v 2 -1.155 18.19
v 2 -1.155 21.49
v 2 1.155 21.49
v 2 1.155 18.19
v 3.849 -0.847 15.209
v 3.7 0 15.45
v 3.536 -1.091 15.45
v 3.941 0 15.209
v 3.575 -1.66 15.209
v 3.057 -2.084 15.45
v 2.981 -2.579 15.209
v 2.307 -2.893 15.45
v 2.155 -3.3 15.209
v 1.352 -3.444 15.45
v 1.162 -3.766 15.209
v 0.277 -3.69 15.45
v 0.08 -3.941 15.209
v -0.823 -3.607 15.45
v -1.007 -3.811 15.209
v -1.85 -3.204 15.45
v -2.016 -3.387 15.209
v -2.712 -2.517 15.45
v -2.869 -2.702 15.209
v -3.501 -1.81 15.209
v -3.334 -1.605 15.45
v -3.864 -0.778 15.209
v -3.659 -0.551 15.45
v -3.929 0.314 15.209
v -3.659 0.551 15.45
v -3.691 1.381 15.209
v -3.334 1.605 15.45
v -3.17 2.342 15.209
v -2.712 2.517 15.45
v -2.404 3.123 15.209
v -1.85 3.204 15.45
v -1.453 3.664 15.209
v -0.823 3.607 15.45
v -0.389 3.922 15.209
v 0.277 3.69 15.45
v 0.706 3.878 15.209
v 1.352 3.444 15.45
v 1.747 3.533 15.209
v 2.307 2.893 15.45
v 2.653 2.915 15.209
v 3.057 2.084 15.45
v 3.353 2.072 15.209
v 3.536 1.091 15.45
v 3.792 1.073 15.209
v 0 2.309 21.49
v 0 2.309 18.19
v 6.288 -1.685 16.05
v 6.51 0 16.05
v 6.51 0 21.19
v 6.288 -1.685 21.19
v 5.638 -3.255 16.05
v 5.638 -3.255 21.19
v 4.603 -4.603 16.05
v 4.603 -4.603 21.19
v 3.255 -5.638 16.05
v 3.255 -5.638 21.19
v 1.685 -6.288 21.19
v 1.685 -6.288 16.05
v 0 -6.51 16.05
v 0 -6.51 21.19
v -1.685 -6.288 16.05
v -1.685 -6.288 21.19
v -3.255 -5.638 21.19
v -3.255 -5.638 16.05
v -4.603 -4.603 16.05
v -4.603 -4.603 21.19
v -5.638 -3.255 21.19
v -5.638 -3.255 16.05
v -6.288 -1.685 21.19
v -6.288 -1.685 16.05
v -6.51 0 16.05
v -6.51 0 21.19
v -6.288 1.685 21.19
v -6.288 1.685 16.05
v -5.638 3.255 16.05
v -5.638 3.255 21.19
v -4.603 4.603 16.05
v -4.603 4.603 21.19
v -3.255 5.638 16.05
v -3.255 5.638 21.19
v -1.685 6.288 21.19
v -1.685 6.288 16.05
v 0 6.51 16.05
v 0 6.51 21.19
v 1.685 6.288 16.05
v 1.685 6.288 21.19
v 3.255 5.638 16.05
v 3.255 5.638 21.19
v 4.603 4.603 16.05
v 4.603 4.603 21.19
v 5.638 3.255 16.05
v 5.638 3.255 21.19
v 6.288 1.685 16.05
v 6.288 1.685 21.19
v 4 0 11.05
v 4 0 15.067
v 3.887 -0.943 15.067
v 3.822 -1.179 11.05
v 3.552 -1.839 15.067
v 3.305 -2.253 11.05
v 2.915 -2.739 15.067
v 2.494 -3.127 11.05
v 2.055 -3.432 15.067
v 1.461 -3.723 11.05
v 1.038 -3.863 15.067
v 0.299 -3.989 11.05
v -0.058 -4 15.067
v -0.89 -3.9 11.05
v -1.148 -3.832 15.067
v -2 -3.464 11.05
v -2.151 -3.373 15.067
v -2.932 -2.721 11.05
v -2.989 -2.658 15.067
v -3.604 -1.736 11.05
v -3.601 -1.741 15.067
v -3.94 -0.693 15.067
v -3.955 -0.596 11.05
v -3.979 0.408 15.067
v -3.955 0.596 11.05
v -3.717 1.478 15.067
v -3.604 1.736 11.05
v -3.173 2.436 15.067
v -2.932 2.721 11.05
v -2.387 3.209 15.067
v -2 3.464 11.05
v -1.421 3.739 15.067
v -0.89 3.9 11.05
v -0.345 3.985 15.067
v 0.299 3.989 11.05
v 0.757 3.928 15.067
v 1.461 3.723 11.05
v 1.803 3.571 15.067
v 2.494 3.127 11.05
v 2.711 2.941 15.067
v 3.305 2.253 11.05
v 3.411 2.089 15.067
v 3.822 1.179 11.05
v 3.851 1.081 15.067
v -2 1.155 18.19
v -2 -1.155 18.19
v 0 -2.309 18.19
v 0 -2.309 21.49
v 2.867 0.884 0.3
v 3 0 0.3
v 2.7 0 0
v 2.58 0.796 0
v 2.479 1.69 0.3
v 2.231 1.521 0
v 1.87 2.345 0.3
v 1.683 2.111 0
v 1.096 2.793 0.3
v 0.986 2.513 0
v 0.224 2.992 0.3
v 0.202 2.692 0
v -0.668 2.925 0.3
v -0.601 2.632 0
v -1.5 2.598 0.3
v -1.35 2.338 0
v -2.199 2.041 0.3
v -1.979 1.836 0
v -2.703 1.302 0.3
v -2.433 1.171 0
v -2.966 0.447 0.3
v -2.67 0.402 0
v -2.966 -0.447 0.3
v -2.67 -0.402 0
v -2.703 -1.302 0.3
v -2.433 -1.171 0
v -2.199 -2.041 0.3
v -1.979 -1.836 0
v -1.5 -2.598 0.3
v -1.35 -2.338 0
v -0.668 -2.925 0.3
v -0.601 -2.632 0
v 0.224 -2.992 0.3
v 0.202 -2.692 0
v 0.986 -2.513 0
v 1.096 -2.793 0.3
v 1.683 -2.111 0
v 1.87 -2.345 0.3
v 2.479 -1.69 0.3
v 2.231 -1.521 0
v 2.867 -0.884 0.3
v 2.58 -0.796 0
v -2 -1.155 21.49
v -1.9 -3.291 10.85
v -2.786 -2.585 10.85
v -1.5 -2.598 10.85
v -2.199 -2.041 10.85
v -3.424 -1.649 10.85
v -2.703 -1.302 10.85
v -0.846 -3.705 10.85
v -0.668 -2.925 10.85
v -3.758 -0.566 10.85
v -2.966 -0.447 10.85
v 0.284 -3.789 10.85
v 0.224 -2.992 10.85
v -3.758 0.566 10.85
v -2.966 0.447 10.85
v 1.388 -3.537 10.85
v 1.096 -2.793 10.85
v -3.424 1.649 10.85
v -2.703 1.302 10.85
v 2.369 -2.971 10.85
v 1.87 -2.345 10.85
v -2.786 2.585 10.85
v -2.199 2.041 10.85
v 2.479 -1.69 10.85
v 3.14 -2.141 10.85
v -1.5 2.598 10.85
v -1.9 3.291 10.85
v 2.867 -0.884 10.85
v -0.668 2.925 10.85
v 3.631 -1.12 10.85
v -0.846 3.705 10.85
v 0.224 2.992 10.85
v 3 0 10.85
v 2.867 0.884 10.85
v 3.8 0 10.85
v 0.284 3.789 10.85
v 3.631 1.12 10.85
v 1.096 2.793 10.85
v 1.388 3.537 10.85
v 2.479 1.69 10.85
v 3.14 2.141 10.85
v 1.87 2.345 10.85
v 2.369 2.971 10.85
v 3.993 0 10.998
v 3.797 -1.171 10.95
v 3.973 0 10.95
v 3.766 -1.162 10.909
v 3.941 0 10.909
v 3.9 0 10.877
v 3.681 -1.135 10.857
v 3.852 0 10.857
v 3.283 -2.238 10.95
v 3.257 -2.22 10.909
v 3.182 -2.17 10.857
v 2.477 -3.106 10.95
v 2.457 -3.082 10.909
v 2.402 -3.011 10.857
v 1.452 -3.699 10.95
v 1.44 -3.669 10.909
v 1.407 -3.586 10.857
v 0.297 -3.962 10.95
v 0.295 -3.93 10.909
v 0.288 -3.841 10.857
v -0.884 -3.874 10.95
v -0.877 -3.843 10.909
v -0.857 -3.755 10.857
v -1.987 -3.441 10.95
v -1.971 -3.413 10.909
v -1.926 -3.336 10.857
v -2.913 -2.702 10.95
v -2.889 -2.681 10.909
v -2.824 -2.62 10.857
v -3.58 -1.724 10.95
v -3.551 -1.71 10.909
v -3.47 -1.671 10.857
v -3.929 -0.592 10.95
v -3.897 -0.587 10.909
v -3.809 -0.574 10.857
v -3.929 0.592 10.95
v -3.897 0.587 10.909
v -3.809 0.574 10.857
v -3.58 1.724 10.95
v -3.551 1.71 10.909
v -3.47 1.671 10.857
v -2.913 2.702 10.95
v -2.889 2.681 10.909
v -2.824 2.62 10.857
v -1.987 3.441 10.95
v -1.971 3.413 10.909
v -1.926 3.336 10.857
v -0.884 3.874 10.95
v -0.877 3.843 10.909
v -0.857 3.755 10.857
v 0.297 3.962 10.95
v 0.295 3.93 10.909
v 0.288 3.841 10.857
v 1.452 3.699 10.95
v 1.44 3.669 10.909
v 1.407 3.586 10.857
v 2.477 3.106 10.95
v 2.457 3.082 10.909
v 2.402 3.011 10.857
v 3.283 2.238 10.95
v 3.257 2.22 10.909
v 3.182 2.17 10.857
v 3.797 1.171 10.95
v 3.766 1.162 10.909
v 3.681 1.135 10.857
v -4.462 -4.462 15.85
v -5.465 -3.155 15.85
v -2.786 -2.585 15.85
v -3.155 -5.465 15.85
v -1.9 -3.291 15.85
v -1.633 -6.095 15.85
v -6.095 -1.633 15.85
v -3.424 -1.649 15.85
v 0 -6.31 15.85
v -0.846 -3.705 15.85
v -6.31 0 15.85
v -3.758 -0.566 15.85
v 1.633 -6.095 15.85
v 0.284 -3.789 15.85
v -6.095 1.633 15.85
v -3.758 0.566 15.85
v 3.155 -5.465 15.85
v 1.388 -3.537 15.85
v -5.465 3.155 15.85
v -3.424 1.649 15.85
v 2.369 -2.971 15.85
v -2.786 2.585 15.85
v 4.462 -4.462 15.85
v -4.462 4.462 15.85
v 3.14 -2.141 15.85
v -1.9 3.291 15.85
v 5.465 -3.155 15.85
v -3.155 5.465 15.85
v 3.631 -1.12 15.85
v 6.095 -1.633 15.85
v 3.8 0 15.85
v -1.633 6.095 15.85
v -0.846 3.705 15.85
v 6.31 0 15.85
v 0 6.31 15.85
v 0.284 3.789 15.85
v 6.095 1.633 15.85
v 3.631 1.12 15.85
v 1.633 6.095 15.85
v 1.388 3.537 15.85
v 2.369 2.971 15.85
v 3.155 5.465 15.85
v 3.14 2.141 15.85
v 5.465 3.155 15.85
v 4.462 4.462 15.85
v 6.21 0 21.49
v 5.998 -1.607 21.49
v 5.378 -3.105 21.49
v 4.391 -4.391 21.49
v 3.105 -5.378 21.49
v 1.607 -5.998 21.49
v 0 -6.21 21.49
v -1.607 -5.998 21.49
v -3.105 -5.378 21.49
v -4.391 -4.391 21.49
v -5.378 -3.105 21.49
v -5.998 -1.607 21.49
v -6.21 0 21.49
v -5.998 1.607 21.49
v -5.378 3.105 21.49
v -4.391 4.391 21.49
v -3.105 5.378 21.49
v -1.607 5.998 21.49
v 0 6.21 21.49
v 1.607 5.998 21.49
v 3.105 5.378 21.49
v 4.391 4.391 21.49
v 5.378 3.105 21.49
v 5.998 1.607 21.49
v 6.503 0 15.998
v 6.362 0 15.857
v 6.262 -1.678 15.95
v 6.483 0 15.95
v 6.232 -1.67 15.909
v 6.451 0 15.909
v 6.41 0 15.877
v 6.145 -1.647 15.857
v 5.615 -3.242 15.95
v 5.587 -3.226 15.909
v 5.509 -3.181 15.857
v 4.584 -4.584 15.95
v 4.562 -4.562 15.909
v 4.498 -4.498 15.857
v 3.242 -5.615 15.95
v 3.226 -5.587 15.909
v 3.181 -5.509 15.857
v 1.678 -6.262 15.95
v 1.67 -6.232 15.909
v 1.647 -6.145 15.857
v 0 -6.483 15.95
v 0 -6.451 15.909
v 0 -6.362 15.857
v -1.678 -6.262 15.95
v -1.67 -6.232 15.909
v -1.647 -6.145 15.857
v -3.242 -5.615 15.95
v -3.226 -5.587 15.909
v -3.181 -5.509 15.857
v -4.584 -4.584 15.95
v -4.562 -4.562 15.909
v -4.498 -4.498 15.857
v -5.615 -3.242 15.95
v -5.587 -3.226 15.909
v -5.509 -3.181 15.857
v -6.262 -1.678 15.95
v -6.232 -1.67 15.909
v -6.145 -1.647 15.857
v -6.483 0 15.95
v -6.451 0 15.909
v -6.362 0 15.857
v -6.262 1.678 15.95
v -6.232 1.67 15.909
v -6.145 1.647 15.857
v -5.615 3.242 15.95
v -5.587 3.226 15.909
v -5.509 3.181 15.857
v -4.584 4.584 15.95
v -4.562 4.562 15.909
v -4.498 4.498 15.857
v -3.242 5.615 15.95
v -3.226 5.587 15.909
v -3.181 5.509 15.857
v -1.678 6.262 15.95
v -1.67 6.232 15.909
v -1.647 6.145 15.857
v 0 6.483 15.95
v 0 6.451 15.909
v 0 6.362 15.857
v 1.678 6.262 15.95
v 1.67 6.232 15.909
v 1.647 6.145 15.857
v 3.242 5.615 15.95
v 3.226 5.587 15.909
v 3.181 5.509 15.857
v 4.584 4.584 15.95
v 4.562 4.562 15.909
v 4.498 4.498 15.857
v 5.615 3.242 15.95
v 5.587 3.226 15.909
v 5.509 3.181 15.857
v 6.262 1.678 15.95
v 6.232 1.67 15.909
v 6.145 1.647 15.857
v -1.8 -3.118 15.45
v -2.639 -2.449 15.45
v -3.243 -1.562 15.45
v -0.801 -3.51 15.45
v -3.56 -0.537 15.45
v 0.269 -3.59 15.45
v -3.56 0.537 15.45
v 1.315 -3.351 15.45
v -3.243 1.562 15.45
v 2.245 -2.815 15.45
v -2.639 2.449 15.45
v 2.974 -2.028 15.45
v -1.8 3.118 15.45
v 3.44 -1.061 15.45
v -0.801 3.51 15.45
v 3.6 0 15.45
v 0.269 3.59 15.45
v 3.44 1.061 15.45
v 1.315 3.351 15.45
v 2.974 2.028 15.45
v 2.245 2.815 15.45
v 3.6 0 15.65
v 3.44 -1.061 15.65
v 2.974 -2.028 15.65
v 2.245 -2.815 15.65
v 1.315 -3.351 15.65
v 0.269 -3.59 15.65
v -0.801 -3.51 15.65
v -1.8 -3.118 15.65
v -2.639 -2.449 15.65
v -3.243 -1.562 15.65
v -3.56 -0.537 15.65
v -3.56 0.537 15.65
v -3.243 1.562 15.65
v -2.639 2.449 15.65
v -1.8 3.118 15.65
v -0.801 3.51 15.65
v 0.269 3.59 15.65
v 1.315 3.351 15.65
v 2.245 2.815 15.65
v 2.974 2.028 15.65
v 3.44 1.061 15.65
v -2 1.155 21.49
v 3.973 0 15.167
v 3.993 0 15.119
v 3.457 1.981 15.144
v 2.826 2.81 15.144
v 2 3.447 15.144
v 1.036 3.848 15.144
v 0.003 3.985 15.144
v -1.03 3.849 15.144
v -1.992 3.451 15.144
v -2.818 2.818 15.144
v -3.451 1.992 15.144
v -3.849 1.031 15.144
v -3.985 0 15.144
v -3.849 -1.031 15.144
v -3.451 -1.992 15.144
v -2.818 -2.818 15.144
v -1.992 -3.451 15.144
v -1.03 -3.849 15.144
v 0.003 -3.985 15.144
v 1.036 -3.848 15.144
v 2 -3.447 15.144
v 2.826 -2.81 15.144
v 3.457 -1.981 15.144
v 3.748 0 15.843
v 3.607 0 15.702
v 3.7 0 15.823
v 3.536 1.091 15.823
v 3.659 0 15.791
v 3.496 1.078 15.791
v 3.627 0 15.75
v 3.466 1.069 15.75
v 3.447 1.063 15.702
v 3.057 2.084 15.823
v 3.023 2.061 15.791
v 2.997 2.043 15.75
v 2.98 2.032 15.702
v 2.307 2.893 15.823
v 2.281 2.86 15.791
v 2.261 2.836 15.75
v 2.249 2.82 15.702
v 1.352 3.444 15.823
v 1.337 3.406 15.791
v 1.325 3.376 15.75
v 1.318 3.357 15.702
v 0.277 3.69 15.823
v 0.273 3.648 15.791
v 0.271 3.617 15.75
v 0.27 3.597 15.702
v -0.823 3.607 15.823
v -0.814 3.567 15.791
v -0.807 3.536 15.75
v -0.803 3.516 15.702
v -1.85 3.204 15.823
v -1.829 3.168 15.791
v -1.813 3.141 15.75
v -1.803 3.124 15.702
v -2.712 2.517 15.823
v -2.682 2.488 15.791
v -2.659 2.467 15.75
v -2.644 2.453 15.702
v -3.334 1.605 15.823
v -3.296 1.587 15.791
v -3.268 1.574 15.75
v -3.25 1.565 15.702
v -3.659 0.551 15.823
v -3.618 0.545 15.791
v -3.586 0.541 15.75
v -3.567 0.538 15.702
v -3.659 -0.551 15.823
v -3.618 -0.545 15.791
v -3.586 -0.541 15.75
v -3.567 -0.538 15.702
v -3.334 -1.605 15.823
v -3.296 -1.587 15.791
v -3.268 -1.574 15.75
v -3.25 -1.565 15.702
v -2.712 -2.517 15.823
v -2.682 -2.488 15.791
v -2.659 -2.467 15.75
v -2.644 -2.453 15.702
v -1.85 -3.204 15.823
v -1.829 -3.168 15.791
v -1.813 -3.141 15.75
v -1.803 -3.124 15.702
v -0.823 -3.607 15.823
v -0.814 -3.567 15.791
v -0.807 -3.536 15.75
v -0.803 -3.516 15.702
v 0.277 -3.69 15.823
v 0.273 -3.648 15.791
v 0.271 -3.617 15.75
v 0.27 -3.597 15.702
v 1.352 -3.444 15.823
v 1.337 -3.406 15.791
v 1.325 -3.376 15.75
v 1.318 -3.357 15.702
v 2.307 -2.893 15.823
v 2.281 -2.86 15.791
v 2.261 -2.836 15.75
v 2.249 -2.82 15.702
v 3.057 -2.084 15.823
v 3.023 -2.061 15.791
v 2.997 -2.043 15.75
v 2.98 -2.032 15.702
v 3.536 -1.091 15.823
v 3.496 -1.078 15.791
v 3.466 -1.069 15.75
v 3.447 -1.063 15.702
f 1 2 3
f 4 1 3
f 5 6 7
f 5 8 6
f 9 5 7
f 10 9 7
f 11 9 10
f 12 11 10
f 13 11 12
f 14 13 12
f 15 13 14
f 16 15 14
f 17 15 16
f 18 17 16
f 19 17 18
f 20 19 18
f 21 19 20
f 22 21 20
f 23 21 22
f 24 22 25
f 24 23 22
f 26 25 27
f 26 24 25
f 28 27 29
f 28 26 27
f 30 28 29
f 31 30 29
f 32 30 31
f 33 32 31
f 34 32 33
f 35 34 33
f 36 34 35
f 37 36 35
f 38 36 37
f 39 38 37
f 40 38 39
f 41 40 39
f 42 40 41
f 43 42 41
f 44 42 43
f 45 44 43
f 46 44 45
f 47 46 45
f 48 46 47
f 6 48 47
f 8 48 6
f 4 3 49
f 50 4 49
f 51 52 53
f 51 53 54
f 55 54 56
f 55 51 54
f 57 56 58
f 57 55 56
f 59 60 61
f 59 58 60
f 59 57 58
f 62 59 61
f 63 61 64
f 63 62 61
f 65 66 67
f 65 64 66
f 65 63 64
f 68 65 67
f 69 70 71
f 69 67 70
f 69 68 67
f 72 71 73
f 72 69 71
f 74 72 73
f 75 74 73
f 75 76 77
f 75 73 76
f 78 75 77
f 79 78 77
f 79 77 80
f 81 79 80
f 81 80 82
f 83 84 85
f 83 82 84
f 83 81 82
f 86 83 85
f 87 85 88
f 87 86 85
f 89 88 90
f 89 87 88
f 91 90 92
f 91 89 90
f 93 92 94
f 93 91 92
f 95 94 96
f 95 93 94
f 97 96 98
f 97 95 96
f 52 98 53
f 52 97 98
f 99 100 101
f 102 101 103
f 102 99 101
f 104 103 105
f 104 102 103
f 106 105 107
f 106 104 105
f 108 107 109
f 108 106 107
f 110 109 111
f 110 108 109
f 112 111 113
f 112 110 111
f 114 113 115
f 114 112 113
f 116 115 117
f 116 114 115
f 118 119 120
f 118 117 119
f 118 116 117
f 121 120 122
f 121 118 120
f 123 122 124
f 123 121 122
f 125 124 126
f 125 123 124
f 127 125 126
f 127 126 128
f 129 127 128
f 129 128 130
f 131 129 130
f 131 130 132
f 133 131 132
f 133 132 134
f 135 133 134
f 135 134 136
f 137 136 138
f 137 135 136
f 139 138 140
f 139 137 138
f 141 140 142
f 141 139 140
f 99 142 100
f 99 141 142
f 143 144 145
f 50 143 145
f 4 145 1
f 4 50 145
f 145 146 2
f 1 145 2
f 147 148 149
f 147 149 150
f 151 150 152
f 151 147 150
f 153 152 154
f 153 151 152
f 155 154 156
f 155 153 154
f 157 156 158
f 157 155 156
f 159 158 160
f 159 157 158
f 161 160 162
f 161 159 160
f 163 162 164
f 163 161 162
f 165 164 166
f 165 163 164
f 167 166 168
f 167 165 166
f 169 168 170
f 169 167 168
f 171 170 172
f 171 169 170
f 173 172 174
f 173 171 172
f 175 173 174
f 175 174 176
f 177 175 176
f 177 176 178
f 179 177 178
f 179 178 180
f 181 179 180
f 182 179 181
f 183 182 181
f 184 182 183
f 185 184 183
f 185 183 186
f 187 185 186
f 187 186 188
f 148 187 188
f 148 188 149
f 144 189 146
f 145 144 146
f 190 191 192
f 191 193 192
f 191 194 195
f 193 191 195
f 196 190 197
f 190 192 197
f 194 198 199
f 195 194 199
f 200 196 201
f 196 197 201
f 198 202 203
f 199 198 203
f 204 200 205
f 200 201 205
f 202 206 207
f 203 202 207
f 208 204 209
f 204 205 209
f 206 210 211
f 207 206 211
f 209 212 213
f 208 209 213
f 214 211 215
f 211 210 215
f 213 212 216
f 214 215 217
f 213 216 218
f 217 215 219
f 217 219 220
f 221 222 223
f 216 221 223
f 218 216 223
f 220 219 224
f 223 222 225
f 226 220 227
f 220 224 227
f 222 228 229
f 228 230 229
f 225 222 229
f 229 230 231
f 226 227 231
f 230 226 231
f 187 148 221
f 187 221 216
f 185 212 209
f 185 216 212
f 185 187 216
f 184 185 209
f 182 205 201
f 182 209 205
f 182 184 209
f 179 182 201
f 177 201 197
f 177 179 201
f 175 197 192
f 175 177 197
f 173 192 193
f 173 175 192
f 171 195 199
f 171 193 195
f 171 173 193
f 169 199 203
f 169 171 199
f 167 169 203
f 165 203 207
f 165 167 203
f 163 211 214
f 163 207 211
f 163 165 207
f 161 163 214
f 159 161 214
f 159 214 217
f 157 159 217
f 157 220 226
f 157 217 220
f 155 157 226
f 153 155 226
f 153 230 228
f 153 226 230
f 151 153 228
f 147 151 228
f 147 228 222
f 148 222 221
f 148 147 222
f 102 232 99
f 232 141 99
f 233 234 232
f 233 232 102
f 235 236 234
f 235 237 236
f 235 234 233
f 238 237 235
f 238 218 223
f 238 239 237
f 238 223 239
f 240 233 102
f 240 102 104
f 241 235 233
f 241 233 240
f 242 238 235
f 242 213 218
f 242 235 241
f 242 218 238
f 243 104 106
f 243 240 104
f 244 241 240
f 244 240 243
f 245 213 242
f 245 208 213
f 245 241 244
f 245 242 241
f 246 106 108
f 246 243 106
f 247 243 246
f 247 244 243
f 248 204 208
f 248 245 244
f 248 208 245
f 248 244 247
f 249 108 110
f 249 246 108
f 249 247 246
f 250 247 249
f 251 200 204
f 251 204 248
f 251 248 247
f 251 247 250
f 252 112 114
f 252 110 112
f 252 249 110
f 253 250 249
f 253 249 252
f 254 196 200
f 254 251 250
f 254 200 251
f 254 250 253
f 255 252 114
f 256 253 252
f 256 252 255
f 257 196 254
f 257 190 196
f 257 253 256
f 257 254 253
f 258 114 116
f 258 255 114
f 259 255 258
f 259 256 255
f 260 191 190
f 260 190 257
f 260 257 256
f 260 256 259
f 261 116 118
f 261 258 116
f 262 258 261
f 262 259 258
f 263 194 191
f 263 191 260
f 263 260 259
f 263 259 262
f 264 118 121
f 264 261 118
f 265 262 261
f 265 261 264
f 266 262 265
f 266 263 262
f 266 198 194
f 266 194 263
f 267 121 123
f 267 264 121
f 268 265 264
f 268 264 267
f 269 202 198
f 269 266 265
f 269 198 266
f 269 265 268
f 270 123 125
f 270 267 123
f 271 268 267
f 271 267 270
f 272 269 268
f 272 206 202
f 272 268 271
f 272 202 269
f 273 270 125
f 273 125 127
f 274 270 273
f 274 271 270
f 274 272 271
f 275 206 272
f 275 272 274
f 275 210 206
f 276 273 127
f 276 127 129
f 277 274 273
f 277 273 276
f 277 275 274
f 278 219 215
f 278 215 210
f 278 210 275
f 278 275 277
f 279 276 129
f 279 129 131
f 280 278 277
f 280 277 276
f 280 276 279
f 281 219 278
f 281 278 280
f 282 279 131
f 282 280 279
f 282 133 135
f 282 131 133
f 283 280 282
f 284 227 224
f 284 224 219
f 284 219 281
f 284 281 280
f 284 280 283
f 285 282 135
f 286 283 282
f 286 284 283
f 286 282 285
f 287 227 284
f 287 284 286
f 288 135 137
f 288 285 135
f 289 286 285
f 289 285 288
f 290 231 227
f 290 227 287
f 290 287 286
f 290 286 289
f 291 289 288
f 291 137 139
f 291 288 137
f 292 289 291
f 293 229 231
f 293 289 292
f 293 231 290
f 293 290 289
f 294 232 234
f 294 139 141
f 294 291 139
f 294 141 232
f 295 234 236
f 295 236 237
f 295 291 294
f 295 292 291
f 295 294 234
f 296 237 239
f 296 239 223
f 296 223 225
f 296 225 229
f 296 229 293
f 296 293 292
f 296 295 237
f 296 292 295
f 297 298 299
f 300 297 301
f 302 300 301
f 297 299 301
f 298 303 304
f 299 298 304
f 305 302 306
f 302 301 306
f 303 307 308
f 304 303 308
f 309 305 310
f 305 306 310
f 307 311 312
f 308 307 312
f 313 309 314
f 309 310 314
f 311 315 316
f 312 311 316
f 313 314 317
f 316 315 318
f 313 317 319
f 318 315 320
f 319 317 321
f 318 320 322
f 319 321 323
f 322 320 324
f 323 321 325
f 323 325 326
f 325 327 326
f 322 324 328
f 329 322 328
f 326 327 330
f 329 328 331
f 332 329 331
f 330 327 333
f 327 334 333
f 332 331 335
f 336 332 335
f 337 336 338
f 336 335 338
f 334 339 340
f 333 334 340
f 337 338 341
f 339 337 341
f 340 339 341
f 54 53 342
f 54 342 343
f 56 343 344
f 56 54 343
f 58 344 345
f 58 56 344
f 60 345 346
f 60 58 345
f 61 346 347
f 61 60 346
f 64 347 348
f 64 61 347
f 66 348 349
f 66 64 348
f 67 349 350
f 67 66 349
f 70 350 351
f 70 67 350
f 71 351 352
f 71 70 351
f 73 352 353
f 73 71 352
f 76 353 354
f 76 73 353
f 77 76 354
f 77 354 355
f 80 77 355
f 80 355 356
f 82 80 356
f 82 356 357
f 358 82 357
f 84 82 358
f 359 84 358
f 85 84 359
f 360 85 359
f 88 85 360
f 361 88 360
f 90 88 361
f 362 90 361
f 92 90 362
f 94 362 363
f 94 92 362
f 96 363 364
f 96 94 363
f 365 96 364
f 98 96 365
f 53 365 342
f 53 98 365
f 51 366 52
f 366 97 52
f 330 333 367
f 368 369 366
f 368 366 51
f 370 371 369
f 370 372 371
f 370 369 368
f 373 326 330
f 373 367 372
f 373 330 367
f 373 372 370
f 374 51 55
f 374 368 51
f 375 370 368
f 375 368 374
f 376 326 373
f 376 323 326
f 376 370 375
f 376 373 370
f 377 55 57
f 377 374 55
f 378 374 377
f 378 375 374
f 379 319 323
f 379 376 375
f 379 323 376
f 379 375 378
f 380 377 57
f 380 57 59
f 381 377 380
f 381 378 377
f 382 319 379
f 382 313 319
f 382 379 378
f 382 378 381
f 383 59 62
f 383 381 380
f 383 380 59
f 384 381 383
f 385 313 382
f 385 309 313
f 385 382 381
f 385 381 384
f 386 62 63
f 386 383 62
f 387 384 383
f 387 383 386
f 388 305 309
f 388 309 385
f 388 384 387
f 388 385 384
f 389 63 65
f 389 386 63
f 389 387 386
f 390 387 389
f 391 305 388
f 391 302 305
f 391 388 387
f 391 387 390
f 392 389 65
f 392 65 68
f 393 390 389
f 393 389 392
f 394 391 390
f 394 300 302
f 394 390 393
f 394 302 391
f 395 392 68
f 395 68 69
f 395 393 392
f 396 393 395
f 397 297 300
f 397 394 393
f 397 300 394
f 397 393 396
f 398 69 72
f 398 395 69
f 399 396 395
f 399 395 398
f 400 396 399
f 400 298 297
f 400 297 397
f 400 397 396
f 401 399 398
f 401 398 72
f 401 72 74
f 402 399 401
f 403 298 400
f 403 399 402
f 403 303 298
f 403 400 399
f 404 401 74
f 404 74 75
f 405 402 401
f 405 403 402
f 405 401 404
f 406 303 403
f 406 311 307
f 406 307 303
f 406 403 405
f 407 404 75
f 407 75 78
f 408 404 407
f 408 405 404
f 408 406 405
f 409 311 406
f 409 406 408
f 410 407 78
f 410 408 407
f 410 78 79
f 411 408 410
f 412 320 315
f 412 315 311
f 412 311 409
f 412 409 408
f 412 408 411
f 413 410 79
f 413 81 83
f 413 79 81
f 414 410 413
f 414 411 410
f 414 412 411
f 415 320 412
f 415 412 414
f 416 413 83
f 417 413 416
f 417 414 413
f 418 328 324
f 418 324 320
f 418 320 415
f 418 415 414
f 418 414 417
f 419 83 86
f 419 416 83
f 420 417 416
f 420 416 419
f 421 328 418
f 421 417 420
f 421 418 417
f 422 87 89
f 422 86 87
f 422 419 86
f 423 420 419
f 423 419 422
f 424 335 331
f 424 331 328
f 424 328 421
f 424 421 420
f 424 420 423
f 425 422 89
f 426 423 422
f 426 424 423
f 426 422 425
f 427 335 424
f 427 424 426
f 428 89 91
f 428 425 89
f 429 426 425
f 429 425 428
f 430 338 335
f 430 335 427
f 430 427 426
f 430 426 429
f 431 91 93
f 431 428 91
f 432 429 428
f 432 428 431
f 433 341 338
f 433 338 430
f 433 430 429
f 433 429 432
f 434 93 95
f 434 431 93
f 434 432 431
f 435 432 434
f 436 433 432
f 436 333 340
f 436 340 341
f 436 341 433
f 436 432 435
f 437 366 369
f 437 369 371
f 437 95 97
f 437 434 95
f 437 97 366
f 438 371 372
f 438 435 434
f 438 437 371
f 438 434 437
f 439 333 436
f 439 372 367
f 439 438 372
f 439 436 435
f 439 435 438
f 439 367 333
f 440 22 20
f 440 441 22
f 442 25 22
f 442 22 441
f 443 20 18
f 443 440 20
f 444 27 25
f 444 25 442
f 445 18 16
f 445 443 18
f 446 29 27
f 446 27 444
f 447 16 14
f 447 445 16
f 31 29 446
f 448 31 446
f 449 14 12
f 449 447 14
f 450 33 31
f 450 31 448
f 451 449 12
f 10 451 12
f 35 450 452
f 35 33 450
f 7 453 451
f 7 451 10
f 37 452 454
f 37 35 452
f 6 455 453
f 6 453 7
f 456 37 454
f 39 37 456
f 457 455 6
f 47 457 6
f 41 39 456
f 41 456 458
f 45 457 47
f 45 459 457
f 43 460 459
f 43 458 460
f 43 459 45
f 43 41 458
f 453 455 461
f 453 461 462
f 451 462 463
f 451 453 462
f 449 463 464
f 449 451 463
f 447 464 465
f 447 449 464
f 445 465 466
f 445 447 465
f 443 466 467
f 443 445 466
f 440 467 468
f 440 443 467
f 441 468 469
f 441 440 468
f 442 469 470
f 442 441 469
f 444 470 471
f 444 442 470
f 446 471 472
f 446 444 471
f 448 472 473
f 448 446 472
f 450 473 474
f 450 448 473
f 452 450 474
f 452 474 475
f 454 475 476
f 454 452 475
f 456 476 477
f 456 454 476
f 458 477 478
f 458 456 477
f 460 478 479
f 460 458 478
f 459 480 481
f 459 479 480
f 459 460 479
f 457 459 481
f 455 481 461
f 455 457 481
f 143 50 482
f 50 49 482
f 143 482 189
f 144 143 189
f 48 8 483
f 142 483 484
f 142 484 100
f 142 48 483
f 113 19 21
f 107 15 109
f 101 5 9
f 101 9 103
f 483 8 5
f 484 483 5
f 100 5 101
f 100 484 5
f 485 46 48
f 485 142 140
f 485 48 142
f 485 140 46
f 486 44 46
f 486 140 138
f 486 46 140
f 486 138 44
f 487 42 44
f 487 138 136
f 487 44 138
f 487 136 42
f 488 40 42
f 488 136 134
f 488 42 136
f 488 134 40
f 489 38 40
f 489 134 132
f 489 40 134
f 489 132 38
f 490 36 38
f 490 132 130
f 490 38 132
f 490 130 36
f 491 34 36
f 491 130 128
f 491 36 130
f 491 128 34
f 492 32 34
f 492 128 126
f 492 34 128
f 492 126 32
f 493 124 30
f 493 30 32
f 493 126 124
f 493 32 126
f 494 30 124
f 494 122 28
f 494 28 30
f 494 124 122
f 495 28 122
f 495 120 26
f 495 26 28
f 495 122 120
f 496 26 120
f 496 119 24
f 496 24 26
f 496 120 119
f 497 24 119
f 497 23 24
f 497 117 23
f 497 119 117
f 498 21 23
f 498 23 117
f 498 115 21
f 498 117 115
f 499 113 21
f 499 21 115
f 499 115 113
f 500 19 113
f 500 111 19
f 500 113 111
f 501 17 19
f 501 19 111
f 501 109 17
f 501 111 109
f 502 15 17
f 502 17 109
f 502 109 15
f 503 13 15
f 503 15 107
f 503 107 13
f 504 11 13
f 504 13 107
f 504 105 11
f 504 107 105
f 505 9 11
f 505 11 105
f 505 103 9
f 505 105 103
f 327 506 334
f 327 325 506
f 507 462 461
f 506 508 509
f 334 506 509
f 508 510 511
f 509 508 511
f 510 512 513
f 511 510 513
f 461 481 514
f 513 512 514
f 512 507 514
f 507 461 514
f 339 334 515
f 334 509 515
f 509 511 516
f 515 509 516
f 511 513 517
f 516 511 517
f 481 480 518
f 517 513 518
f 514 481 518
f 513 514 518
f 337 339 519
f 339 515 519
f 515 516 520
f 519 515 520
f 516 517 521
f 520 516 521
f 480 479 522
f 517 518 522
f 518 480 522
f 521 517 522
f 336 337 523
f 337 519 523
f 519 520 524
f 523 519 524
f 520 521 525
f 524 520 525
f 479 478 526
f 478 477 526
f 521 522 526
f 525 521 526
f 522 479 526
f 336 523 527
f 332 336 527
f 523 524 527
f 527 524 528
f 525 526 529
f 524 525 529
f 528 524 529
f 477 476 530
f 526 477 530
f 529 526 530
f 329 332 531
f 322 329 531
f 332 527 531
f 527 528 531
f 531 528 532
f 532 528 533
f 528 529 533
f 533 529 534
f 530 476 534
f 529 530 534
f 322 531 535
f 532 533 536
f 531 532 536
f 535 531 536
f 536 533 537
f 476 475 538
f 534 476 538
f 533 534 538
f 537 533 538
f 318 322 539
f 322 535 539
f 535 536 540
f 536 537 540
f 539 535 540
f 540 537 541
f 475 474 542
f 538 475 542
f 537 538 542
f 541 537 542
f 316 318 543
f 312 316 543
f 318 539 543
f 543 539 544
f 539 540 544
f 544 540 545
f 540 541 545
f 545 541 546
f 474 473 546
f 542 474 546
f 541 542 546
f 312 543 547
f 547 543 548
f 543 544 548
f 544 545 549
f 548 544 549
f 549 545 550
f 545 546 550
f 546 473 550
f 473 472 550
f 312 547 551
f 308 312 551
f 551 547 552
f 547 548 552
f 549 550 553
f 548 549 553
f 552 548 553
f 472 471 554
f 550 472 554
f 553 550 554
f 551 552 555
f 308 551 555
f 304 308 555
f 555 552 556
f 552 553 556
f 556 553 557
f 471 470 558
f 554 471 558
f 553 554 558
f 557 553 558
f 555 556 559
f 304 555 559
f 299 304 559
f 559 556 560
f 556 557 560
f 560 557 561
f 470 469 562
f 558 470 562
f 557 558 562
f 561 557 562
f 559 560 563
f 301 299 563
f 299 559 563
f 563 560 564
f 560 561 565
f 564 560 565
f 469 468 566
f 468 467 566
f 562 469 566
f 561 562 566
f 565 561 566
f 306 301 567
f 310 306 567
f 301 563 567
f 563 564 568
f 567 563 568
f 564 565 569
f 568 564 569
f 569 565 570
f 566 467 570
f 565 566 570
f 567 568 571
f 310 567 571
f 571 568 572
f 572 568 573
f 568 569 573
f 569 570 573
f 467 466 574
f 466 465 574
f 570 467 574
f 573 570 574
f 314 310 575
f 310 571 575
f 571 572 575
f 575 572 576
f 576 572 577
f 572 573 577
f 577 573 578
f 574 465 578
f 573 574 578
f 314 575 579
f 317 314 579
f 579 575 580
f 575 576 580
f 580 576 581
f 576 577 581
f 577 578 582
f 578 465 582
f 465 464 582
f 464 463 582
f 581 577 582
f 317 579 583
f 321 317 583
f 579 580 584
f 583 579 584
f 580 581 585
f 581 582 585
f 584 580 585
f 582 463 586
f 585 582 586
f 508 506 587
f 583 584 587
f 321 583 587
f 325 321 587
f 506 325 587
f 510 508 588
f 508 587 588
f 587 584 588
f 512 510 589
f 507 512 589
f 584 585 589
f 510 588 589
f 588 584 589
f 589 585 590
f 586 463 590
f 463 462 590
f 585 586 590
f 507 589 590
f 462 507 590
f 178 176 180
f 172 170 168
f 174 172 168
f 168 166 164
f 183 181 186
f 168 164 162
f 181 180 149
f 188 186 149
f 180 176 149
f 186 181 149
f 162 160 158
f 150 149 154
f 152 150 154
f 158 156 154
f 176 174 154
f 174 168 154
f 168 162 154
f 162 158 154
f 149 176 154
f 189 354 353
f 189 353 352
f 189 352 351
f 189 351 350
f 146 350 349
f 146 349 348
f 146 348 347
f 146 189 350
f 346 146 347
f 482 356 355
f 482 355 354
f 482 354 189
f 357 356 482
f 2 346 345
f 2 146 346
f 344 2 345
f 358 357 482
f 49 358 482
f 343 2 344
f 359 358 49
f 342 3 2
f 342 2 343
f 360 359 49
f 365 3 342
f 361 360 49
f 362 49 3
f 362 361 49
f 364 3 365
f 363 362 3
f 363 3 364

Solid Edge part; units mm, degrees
sketch "Sketch1" plane through (0, 0, 0) normal (0, -1, 0) x (1, 0, 0)
  line L0 (0, 21.49) -> (6.51, 21.49)
  line L1 (6.51, 21.49) -> (6.51, 15.85)
  line L2 (6.51, 15.85) -> (3.6, 15.85)
  line L3 (3.6, 15.85) -> (3.6, 15.45)
  line L4 (3.6, 15.45) -> (4, 15.45)
  line L5 (4, 15.45) -> (4, 10.85)
  line L6 (4, 10.85) -> (3, 10.85)
  line L7 (3, 10.85) -> (3, 0)
  line L8 (3, 0) -> (0, 0)
  dimension "D1" = 6.51
  dimension "D2" = 5.64
  dimension "D3" = 5
  dimension "D4" = 0.4
  dimension "D5" = 10.85
  dimension "D6" = 4
  dimension "D7" = 3
revolve "RevolvedProtrusion1" add sketch "Sketch1" angle 360 about axis through (0, 0, 0) along (0, 0, 1)
chamfer "Chamfer1" distance 0.3 angle 45 3 edges at (-4, 0, 15.45) (-6.51, 0, 21.49) (-3, 0, 0)
fillet "Round_1" radius 0.2 4 edges at (-6.51, 0, 15.85) (-3.6, 0, 15.85) (-4, 0, 10.85) (-4, 0, 15.15)
sketch "Sketch2" plane through (0, 0, 21.49) normal (0, 0, 1) x (1, 0, 0)
  line L0 (2, 1.1547) -> (0, 2.3094)
  line L1 (0, 2.3094) -> (-2, 1.1547)
  line L2 (-2, 1.1547) -> (-2, -1.1547)
  line L3 (-2, -1.1547) -> (0, -2.3094)
  line L4 (0, -2.3094) -> (2, -1.1547)
  line L5 (2, -1.1547) -> (2, 1.1547)
  dimension "D1" = 4
extrude "ExtrudedCutout_1" cut sketch "Sketch2" against normal blind 3.3
